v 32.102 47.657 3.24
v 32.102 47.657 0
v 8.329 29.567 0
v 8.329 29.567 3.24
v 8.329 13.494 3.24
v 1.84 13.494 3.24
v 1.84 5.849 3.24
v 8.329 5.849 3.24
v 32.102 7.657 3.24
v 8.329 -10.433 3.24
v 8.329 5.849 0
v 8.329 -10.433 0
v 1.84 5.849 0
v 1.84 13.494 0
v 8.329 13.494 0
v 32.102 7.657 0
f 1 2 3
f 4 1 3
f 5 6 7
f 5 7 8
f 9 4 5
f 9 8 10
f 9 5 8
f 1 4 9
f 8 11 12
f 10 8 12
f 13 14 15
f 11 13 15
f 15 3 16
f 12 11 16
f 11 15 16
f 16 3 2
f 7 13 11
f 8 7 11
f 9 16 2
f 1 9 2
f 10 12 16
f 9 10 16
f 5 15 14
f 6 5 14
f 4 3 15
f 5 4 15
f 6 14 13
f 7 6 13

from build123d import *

# Parameters (mm, degrees)
F1_DEPTH = 3.24


with BuildPart() as f1:
    # F0 (on Top) → F1 (new body)
    with BuildSketch(Plane.XY):
        Polygon((32.101754, 47.657341), (8.328551, 29.566584), (8.328551, 13.494031), (8.328551, 9.566584), (8.328551, 5.849354), (8.328551, -10.433416), (32.101754, 7.657341), align=None)
        Polygon((8.328551, 9.566584), (8.328551, 13.494031), (1.83994, 13.494031), (1.83994, 5.849354), (8.328551, 5.849354), align=None)
    extrude(amount=F1_DEPTH)


solid = f1.part
